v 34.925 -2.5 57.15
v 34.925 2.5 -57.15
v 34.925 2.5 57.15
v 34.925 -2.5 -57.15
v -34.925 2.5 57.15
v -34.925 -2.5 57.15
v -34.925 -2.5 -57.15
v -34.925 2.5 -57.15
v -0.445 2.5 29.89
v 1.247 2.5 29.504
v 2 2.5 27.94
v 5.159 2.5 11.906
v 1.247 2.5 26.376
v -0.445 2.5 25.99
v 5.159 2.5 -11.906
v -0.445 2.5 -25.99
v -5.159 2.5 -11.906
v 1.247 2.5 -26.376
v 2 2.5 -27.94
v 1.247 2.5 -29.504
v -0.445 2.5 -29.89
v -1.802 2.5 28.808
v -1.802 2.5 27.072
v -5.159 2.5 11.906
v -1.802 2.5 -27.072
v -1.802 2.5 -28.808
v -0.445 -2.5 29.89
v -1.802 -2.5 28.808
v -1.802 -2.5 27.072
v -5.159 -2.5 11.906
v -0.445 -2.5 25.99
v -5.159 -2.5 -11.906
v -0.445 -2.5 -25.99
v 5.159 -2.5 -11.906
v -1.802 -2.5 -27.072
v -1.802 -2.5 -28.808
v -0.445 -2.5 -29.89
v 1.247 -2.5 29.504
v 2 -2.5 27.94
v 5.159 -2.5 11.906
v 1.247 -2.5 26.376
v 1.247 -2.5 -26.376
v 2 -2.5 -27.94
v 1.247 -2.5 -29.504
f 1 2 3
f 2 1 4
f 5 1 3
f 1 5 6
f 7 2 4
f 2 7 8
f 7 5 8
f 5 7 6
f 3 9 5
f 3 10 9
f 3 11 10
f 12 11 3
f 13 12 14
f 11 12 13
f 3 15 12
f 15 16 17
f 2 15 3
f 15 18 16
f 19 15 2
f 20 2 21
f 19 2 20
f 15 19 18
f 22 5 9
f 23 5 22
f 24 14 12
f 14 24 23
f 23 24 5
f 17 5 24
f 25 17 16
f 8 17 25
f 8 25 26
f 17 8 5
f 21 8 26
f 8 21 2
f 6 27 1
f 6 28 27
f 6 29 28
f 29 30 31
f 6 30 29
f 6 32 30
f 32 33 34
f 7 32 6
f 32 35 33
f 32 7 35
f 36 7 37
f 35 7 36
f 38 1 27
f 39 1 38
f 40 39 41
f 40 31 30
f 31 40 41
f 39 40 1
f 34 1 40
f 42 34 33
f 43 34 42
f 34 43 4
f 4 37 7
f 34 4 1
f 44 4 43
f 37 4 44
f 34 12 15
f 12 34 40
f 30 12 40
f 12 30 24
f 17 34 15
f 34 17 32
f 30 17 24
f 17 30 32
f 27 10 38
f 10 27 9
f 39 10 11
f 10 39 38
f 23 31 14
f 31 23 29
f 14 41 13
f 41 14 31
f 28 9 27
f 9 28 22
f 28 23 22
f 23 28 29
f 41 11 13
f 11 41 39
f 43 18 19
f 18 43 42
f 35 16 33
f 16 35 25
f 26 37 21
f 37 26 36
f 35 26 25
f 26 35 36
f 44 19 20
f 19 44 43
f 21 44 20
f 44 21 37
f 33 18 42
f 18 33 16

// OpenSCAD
// https://www.archtoolbox.com/materials-systems/electrical/electricalfaceplates.html
width = 2.75*25.4; //  2-3/4" => mm
height = 4.5*25.4; // 4-1/2" => mm
thickness = 5;
_depth = thickness + 1;

switch_opening_w = (13/32)*25.4; // 13/32" => mm
switch_opening_h = (15/16)*25.4; // 15/16" => mm
module switch_opening() {
    cube([switch_opening_w, _depth, switch_opening_h], center=true);
}

screw_opening_d = 4;
module screw_opening() {
    rotate(a=90, v=[1, 0, 0])
      cylinder(d=screw_opening_d, h=_depth, center=true);
}

difference() {
    cube([width, thickness, height], center = true);
    switch_opening();
    translate([0, 0,  width/2.5]) screw_opening();
    translate([0, 0, -width/2.5]) screw_opening();
;
}
